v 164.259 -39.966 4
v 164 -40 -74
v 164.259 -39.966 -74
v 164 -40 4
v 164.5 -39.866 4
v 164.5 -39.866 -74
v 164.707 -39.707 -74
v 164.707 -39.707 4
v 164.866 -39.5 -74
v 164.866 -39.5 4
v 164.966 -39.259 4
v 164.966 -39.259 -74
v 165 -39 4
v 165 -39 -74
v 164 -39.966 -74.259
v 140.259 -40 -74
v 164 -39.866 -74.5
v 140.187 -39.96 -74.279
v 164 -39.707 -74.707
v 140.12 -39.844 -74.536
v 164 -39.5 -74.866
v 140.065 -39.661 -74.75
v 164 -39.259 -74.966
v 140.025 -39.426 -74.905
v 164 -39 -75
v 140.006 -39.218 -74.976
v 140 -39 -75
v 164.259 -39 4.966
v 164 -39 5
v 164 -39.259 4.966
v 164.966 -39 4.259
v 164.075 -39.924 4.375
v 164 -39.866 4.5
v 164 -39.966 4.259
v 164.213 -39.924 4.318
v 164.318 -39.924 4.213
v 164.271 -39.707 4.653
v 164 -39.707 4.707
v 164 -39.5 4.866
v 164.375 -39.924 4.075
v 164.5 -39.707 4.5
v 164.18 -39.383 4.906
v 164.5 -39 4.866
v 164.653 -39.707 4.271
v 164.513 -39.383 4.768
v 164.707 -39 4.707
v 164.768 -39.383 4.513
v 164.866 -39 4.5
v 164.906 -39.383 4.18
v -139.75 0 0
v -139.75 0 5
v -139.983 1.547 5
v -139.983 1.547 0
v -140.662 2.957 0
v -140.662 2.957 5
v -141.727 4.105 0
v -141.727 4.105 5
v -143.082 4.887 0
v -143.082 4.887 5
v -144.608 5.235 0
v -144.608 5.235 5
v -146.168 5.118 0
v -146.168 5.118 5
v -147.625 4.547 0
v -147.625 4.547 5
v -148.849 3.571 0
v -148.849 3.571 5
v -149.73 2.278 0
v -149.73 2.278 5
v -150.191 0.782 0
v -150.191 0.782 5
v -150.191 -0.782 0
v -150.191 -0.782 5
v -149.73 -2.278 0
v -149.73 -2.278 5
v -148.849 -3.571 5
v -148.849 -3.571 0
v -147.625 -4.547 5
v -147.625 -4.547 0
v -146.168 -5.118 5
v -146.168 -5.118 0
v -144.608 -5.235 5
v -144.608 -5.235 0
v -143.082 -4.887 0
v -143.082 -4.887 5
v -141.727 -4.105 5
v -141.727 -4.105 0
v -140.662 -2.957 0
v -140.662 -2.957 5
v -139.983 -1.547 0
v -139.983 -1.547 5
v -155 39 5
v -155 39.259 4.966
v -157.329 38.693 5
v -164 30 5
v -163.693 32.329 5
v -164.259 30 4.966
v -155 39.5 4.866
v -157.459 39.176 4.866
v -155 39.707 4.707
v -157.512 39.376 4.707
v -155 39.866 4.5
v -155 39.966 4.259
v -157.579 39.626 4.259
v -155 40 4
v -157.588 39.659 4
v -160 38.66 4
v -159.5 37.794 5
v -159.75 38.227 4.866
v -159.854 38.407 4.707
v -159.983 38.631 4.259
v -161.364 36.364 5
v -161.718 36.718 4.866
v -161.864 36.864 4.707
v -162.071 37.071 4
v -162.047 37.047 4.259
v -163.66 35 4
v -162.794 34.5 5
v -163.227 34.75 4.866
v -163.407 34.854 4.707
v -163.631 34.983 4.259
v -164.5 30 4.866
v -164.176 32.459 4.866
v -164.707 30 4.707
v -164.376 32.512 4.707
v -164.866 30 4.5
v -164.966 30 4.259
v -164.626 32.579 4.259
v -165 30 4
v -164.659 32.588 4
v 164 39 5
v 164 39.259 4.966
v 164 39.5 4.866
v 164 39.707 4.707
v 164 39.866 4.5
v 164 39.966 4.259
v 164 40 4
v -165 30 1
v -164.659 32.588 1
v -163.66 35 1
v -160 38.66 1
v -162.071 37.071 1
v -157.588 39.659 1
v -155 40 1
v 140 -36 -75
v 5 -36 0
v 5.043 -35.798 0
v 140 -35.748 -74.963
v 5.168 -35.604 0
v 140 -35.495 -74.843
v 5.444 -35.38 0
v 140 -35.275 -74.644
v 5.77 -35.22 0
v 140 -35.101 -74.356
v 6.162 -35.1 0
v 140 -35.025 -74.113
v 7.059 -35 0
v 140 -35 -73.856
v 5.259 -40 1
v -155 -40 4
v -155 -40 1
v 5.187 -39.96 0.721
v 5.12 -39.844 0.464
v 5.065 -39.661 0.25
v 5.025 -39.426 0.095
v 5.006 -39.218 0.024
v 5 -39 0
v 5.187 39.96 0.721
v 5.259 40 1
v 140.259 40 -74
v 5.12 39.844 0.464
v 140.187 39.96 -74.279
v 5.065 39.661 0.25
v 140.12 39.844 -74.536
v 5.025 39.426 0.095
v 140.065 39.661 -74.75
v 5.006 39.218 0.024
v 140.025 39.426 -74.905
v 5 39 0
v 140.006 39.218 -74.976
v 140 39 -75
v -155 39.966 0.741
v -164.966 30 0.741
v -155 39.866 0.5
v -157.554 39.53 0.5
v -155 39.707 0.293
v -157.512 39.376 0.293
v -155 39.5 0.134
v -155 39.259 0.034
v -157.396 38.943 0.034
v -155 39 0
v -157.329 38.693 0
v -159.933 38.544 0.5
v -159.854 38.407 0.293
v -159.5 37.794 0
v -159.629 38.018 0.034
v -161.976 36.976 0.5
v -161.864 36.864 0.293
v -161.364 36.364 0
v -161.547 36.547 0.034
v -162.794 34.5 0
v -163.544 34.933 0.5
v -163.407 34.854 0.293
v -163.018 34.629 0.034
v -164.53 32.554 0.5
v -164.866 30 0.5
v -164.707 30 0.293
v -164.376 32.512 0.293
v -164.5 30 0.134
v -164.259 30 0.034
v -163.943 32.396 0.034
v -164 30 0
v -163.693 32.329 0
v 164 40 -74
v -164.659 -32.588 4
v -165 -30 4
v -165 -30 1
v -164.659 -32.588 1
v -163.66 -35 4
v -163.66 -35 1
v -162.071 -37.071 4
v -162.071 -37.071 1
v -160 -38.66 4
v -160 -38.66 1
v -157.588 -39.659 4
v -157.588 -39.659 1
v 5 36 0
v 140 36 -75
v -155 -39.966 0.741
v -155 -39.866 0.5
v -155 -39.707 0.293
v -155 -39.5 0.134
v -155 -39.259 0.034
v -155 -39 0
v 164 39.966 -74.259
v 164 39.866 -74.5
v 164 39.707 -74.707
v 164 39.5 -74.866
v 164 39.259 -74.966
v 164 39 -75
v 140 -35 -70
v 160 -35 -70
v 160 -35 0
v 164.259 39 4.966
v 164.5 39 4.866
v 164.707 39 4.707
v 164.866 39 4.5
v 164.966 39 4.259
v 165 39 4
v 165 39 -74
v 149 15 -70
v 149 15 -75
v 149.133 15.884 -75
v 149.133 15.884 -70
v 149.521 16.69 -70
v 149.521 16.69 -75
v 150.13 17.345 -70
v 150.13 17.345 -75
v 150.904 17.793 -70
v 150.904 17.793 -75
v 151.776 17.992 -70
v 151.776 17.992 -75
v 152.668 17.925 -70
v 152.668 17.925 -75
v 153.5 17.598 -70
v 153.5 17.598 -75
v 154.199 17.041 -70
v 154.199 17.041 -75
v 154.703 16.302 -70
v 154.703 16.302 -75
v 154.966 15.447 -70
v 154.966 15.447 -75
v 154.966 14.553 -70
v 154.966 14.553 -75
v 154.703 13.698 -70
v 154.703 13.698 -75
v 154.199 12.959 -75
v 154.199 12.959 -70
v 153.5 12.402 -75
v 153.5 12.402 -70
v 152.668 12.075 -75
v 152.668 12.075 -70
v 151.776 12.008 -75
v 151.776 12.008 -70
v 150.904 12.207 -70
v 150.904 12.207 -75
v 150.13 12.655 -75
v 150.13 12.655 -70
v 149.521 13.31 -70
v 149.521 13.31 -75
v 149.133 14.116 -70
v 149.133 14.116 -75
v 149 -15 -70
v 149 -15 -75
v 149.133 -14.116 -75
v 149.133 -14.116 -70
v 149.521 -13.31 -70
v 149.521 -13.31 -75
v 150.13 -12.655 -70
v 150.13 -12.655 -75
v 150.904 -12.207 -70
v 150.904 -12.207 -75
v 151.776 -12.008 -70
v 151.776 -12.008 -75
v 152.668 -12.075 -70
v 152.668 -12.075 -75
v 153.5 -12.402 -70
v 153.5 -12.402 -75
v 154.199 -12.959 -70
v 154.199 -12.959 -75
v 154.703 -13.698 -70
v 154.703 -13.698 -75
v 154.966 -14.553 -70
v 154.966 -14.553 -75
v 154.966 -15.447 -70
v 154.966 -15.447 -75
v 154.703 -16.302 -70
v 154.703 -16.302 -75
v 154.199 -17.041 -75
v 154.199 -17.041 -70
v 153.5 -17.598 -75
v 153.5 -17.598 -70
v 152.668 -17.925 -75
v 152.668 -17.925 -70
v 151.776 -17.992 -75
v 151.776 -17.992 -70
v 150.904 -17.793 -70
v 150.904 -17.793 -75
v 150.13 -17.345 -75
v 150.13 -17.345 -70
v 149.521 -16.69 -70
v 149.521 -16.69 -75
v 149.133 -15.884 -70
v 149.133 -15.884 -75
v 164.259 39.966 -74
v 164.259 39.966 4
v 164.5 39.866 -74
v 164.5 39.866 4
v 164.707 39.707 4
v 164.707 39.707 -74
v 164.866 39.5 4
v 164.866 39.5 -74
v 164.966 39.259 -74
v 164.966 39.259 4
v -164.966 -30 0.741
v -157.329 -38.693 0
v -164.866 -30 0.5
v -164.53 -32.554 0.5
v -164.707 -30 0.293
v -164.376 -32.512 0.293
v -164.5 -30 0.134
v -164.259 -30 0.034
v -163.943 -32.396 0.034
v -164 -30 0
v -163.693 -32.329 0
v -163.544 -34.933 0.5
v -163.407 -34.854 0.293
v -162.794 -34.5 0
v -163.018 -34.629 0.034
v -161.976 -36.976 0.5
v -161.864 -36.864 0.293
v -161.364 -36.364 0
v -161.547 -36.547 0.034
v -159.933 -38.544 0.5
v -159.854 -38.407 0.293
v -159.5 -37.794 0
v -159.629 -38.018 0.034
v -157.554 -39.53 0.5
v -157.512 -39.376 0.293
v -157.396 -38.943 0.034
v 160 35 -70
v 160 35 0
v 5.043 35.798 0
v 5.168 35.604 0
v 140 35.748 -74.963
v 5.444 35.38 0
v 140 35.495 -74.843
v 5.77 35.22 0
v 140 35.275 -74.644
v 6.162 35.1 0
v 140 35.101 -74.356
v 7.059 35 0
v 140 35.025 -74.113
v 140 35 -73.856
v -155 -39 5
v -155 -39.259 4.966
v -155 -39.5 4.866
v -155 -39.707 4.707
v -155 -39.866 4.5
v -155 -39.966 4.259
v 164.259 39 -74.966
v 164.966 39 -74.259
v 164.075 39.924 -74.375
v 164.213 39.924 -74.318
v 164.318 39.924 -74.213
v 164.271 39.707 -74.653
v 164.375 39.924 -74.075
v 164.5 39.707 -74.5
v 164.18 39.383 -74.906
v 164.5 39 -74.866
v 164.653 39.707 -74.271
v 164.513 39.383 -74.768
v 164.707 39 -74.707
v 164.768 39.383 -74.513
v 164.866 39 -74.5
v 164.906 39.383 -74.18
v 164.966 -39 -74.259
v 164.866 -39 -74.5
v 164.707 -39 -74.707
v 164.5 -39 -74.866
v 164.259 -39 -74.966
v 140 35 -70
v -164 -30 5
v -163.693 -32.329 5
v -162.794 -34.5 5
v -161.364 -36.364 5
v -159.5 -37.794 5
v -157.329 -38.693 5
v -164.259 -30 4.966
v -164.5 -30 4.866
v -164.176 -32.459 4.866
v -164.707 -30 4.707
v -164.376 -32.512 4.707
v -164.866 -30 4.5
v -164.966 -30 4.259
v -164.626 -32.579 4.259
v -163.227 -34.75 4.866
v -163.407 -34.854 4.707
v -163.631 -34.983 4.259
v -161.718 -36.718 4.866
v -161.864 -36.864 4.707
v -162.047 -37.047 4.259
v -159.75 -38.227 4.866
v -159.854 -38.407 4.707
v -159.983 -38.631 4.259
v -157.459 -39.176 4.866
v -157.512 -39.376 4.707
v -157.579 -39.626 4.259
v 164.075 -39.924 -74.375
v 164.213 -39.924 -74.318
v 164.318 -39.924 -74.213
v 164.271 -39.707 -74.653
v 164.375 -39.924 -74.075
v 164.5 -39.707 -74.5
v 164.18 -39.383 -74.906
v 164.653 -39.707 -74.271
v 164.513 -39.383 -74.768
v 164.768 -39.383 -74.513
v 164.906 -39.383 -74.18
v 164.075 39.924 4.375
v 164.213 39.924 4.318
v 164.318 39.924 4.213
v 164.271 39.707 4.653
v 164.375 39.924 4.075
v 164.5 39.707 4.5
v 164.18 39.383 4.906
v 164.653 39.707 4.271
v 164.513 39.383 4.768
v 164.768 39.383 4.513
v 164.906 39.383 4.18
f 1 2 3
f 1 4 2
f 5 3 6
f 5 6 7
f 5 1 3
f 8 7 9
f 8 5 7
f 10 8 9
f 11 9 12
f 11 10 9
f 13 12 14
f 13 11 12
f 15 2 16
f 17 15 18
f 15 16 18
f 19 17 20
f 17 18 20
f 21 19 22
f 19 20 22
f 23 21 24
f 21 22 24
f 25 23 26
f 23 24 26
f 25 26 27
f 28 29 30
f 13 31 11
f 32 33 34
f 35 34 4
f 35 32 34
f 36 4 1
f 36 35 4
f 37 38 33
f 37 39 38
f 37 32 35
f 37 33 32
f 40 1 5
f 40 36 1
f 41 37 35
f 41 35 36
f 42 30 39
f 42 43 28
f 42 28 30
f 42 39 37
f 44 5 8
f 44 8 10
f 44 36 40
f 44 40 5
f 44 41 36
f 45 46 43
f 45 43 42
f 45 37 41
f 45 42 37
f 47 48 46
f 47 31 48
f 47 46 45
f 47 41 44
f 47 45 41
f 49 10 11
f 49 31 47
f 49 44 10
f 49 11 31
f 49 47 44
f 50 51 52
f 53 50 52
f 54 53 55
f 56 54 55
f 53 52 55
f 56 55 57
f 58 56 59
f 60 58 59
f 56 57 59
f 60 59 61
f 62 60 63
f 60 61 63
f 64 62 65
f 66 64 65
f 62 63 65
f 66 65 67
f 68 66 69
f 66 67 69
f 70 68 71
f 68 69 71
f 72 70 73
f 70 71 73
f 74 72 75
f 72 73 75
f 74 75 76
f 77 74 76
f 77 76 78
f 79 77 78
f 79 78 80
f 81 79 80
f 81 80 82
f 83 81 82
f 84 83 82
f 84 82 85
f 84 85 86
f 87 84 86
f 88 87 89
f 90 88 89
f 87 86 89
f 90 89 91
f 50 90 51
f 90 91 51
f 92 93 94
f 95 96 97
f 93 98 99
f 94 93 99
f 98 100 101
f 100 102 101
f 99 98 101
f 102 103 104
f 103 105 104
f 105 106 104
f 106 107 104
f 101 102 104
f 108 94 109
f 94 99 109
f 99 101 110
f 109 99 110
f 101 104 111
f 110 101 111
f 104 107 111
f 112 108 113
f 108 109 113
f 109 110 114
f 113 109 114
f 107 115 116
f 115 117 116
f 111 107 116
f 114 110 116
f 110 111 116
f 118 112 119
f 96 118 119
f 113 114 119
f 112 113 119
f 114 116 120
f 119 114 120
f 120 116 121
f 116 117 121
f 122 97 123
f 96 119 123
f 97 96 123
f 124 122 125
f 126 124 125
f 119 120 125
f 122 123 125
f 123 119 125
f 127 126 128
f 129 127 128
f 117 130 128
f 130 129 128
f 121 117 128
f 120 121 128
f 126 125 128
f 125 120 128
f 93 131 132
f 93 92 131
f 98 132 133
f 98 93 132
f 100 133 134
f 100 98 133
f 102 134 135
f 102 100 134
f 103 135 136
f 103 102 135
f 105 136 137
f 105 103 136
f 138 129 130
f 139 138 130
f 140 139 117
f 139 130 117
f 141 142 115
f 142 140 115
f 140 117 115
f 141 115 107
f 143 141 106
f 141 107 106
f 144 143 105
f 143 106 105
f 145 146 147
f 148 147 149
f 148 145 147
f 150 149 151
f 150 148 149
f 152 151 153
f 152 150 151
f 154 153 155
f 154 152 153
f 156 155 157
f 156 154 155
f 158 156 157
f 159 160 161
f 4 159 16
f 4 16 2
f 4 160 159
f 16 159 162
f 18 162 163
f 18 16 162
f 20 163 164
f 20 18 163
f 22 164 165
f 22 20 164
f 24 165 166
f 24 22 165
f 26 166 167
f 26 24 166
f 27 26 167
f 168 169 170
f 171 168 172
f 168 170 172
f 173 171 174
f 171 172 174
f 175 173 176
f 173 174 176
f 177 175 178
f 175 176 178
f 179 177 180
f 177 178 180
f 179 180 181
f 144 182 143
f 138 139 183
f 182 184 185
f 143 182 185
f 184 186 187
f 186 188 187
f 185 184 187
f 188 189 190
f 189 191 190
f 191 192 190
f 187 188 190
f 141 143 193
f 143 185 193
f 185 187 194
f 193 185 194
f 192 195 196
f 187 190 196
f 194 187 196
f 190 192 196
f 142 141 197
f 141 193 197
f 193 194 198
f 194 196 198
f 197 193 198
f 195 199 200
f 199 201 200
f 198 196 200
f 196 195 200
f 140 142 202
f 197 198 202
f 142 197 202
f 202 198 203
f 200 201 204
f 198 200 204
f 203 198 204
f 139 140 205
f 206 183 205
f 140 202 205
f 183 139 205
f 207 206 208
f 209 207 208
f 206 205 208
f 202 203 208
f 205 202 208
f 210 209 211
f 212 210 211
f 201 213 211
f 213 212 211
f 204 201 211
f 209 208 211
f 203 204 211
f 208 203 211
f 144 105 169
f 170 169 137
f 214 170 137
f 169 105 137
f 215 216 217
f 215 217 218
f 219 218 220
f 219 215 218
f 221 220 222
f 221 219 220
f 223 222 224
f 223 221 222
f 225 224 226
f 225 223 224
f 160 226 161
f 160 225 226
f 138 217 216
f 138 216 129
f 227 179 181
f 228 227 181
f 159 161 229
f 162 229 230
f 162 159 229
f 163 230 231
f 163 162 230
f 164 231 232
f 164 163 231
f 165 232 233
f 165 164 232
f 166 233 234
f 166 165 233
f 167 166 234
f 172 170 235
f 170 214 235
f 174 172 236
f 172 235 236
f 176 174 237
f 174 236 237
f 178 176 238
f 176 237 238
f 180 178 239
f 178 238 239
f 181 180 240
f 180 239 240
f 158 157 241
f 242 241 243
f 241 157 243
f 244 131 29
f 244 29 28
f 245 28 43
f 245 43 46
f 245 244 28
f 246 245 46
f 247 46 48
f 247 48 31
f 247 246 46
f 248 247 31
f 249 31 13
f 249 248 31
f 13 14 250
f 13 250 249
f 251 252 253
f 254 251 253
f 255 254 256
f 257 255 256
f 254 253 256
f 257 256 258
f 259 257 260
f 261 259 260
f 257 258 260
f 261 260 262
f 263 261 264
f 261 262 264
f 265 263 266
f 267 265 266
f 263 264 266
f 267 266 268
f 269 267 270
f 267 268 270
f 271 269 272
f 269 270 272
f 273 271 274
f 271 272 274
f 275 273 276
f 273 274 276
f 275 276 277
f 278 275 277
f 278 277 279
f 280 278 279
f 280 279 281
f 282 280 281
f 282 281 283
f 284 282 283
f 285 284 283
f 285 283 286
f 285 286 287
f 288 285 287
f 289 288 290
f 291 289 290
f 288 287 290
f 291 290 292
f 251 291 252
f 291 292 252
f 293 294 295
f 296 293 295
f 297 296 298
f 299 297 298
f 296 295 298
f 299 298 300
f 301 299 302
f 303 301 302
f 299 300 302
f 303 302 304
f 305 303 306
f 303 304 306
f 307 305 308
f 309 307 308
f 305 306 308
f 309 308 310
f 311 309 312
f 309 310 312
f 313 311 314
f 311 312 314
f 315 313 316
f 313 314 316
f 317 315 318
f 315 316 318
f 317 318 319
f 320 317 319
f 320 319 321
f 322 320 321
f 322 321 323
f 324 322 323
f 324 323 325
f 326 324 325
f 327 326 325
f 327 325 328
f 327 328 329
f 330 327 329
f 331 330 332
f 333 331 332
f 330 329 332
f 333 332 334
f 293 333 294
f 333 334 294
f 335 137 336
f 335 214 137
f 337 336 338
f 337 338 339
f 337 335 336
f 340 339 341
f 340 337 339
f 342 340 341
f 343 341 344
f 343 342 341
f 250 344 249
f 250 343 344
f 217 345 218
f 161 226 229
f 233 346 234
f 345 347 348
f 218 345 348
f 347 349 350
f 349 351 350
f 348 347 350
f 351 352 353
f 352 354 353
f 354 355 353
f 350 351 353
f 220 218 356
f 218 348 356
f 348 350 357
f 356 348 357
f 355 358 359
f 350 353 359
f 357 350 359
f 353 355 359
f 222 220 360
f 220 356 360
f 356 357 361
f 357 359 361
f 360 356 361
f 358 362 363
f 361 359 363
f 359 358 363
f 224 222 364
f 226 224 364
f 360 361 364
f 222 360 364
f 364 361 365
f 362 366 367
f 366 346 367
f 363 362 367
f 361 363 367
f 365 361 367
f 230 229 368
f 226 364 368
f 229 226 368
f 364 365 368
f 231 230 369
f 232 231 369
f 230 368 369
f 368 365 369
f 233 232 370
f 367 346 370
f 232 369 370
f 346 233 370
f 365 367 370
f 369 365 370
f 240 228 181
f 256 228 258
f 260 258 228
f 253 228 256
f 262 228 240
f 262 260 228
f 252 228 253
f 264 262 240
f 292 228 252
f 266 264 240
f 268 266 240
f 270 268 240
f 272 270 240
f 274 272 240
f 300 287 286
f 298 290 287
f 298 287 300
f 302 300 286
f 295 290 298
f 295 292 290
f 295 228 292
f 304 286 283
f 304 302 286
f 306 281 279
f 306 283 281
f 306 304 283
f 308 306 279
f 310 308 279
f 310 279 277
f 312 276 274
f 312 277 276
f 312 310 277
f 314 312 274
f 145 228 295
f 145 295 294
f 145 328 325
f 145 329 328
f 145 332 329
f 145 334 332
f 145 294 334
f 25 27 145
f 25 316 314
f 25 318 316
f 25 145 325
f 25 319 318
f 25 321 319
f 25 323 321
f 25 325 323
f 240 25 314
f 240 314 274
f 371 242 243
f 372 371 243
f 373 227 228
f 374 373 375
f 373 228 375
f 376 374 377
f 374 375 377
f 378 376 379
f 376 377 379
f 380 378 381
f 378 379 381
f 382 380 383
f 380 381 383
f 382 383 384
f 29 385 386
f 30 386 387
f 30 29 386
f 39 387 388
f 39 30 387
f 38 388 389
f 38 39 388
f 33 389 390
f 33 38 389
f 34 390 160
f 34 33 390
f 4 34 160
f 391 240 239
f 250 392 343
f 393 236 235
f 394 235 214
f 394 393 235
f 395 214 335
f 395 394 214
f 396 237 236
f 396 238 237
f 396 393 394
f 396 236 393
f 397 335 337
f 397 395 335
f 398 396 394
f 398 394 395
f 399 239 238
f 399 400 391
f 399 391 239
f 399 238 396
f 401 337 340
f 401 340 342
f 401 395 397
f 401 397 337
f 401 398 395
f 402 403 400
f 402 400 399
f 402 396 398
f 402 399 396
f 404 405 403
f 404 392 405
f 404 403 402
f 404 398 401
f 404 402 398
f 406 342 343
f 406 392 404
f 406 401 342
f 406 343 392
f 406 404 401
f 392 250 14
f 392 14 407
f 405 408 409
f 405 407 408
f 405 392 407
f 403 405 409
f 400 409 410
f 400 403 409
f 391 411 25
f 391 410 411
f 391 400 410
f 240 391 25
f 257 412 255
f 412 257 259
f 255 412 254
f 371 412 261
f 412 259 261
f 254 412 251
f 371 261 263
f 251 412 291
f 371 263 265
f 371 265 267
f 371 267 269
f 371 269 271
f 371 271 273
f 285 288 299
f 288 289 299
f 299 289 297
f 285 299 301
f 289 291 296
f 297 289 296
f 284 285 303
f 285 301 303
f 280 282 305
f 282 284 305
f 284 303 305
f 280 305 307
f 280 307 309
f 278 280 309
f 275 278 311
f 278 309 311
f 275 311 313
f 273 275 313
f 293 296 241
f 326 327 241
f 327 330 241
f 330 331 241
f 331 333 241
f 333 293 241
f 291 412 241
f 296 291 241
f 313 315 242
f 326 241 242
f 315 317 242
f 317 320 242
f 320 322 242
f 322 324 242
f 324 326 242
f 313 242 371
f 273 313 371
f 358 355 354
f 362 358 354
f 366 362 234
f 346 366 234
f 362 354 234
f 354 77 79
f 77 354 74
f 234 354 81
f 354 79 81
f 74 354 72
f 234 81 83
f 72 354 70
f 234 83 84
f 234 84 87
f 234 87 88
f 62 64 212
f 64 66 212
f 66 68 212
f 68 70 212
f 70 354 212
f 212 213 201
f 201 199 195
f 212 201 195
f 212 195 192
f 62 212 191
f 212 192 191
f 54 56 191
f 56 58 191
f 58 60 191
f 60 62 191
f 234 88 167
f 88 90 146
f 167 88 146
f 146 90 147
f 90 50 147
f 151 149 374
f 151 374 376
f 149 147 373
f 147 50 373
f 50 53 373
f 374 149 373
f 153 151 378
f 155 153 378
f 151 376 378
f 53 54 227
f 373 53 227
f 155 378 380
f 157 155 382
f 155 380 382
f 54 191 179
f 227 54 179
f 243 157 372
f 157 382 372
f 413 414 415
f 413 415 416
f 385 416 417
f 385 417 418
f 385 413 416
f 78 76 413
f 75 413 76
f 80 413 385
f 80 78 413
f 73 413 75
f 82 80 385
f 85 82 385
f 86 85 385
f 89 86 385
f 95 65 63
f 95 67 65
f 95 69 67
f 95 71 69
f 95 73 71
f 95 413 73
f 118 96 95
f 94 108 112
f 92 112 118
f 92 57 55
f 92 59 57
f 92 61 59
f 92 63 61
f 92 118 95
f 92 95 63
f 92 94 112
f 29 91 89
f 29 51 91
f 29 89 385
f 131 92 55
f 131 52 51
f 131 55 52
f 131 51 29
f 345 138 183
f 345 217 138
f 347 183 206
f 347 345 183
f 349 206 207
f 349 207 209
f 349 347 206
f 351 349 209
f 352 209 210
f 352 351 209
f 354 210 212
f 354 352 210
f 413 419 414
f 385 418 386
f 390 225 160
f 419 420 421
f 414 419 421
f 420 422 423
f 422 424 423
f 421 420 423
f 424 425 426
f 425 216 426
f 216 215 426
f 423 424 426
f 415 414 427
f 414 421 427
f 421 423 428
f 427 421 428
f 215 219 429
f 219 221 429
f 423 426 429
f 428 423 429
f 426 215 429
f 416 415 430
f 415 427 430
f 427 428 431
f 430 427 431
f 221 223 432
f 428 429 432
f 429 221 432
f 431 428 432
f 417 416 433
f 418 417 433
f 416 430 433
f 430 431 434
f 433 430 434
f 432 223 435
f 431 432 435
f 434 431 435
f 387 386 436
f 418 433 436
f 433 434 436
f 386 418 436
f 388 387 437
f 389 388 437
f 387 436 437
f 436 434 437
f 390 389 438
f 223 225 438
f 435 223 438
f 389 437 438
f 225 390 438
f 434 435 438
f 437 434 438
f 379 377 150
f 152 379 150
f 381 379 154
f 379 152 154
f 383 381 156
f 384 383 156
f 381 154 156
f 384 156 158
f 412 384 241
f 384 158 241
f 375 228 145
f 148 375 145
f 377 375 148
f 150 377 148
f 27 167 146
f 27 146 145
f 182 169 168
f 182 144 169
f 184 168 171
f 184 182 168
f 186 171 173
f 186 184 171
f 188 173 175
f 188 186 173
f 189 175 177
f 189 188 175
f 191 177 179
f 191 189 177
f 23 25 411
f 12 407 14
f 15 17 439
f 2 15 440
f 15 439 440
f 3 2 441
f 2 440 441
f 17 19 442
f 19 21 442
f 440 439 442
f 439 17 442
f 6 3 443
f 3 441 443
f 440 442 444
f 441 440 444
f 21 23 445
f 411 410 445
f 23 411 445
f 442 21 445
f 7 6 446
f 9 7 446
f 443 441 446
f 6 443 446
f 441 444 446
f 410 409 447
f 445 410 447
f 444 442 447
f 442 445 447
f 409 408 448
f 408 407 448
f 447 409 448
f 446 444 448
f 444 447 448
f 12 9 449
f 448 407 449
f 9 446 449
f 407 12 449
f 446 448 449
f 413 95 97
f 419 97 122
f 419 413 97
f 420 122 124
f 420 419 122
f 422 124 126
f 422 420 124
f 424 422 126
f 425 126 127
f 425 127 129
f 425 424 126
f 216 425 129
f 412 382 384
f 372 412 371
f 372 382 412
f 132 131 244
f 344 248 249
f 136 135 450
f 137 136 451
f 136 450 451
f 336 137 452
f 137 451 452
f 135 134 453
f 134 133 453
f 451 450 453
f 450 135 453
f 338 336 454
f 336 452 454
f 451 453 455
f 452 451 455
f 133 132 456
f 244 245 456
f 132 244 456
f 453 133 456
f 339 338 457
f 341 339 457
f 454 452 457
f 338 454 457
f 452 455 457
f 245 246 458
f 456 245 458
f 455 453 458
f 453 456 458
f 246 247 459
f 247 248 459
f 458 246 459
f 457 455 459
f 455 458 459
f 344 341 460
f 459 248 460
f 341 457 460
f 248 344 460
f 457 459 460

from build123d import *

# Parameters (mm, degrees)
SKETCH_1_W          = 330
SKETCH_1_H          = 80
EXTRUDE_1_DEPTH     = 5
SKETCH_2_R          = 5.25
CUT_EXTRUDE_1_DEPTH = 5
SKETCH_3_R          = 4
CUT_EXTRUDE_2_DEPTH = 10
FILLET_1_R          = 10
SKETCH_13_R         = 6.969385005
EXTRUDE_5_DEPTH     = 5
SKETCH_14_W         = 5
SKETCH_14_H         = 75
EXTRUDE_6_DEPTH     = 80
SKETCH_15_W         = 20
SKETCH_15_H         = 5
EXTRUDE_7_DEPTH     = 80
EXTRUDE_8_DEPTH     = 5
SKETCH_17_R         = 3
CUT_EXTRUDE_5_DEPTH = 5
FILLET_2_R          = 1


with BuildPart() as part:
    # 草图1 → 凸台-拉伸1 (new body)
    with BuildSketch(Plane.XY):
        Rectangle(SKETCH_1_W, SKETCH_1_H)
    extrude(amount=EXTRUDE_1_DEPTH)

    # 草图2 → 切除-拉伸1 (cut)
    with BuildSketch(Plane.XY.offset(5)):
        with Locations((-145, 0)):
            Circle(SKETCH_2_R)
    extrude(amount=-CUT_EXTRUDE_1_DEPTH, mode=Mode.SUBTRACT)

    # 草图3 → 切除-拉伸2 (cut)
    with BuildSketch(Plane.XY.offset(5)):
        with Locations((-45, 0)):
            Circle(SKETCH_3_R)
    extrude(amount=-CUT_EXTRUDE_2_DEPTH, mode=Mode.SUBTRACT)

    # 圆角1
    fillet_1_edges = [part.edges().sort_by_distance(p)[0] for p in [
        (-165, 40, 2.5),
        (-165, -40, 2.5),
    ]]
    fillet(fillet_1_edges, radius=FILLET_1_R)

    # 草图13 → 凸台-拉伸5 (add)
    with BuildSketch(Plane.XY.offset(5)):
        with Locations((-45, 0)):
            Circle(SKETCH_13_R)
    extrude(amount=-EXTRUDE_5_DEPTH)

    # 草图14 → 凸台-拉伸6 (add)
    with BuildSketch(Plane.XZ.offset(40)):
        with Locations((162.5, -37.5)):
            Rectangle(SKETCH_14_W, SKETCH_14_H)
    extrude(amount=-EXTRUDE_6_DEPTH)

    # 草图15 → 凸台-拉伸7 (add)
    with BuildSketch(Plane.XZ.offset(40)):
        with Locations((150, -72.5)):
            Rectangle(SKETCH_15_W, SKETCH_15_H)
    extrude(amount=-EXTRUDE_7_DEPTH)

    # 草图16 → 凸台-拉伸8 (add)
    with BuildSketch(Plane.XZ.offset(40)):
        Polygon((5, 5), (5, 0), (140, -75), (165, -75), (165, 5), align=None)
    extrude_8 = extrude(amount=-EXTRUDE_8_DEPTH)

    # 镜向1: 凸台-拉伸8 across plane
    add(extrude_8.mirror(Plane.ZX))

    # 草图17 → 切除-拉伸5 (cut)
    with BuildSketch(Plane(origin=(0, 0, -75), x_dir=(-1, 0, 0), z_dir=(0, 0, -1))):
        with Locations((-152, -15)):
            Circle(SKETCH_17_R)
        with Locations((-152, 15)):
            Circle(SKETCH_17_R)
    extrude(amount=-CUT_EXTRUDE_5_DEPTH, mode=Mode.SUBTRACT)

    # 圆角2
    fillet_2_edges = [part.edges().sort_by_distance(p)[0] for p in [
        (72.5, 40, -37.5),
        (72.5, 35, -37.5),
        (165, 0, 5),
        (5, 40, 5),
        (-75, -40, 0),
        (5, -40, 5),
        (-165, 0, 0),
        (-162.071067812, 37.071067812, 0),
        (-162.071067812, -37.071067812, 0),
        (-165, 0, 5),
        (-162.071067812, 37.071067812, 5),
        (-162.071067812, -37.071067812, 5),
        (165, 0, -75),
        (152.5, -40, -75),
        (152.5, 40, -75),
        (72.5, -40, -37.5),
        (72.5, -35, -37.5),
        (165, 40, -35),
        (165, -40, -35),
        (-75, 40, 0),
    ]]
    fillet(fillet_2_edges, radius=FILLET_2_R)


solid = part.part
